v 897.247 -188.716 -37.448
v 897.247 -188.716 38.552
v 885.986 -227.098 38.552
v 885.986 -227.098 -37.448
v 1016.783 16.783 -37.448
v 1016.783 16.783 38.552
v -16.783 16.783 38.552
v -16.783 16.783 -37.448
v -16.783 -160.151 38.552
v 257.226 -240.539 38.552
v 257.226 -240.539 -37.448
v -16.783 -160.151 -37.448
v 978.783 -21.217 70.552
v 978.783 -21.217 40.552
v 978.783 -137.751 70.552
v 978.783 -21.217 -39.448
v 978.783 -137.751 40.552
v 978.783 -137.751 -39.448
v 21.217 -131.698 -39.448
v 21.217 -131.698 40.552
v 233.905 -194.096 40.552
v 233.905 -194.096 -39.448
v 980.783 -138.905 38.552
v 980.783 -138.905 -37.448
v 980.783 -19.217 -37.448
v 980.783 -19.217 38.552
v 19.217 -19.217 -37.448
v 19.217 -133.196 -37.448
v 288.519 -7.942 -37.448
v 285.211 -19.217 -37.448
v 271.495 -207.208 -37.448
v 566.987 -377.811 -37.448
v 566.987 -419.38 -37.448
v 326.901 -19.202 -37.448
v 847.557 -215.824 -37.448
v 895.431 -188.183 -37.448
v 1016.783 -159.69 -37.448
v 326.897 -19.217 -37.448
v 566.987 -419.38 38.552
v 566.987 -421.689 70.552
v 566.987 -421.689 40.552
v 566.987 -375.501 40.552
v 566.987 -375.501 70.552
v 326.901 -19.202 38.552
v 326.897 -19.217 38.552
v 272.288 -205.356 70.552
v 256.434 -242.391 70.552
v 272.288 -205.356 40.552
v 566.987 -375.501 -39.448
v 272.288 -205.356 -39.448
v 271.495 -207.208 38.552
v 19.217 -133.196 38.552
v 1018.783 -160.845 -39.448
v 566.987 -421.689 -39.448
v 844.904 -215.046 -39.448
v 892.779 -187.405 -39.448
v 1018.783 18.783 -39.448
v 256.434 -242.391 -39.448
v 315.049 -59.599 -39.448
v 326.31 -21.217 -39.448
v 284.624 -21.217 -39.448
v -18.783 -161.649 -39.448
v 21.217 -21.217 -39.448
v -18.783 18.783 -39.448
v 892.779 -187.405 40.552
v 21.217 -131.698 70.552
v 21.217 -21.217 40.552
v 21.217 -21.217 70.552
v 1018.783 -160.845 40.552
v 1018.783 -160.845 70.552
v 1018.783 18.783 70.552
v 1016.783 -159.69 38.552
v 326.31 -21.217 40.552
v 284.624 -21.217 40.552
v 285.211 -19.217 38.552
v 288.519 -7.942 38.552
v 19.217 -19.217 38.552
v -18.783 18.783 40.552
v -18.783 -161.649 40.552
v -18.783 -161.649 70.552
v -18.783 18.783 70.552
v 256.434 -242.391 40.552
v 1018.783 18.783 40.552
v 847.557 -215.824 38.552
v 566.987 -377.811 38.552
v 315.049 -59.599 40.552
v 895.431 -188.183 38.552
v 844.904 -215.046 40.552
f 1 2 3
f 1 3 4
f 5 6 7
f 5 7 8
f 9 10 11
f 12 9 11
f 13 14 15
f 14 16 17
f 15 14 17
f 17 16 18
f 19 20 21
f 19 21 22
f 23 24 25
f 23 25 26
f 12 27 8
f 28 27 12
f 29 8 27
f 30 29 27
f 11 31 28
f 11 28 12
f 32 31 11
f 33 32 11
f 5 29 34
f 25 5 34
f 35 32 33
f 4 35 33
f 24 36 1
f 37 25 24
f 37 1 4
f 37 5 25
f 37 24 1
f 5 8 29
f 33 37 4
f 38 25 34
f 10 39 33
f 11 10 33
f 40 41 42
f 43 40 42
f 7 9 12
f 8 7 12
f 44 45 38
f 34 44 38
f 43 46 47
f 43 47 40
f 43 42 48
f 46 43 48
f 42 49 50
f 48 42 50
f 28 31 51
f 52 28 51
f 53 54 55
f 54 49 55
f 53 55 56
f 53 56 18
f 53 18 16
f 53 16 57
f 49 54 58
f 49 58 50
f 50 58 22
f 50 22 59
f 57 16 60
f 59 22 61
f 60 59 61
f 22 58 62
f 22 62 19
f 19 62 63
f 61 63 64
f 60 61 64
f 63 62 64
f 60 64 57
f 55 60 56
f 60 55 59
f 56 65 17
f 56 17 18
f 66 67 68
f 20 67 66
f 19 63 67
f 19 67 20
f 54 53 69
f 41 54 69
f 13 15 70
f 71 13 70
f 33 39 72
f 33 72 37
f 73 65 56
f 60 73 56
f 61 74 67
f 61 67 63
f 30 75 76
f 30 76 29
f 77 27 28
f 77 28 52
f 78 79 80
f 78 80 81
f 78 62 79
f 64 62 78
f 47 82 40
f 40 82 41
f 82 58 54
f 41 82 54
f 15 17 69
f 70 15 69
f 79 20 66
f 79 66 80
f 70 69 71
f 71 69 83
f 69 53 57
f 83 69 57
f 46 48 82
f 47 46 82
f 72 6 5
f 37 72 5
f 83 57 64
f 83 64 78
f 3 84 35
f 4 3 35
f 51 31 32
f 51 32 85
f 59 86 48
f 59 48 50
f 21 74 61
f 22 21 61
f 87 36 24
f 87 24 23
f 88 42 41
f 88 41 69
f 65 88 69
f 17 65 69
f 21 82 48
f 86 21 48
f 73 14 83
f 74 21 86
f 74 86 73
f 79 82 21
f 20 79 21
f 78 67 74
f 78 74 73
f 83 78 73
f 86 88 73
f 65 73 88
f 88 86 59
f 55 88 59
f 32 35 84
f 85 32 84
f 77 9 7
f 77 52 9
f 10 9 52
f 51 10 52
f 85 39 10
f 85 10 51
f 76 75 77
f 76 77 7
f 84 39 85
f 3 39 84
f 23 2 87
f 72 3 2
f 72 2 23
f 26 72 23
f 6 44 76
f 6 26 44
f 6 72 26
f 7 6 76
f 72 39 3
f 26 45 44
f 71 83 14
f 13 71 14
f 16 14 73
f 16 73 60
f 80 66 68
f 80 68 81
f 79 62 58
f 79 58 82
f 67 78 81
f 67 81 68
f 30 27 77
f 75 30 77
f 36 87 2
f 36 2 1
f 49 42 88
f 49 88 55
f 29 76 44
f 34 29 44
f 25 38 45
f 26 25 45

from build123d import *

# Parameters (mm, degrees)
SKETCH_6_W      = 80
SKETCH_6_H      = 40
SKETCH_6_W_2    = 76
SKETCH_6_H_2    = 36
SKETCH_14_W     = 40
SKETCH_14_H     = 80
EXTRUDE_1_DEPTH = 194
SKETCH_15_W     = 80
SKETCH_15_H     = 40
EXTRUDE_2_DEPTH = 595
EXTRUDE_3_DEPTH = 30
EXTRUDE_4_DEPTH = 30
EXTRUDE_5_DEPTH = 30


with BuildPart() as part:
    # По траектории13: sweep along a curve in space
    with BuildLine() as sweep_13_path:
        Line((0, 0, 0), (1000, 0, 0))
        Line((1000, 0, 0), (1000, -150, 0))
        Line((1000, -150, 0), (566.987298108, -400, 0))
        Line((566.987298108, -400, 0), (263.878406783, -225, 0))
        Line((263.878406783, -225, 0), (0, -147.584326952, 0))
        Line((0, -147.584326952, 0), (0, 0, 0))
    # Эскиз6 → По траектории13 (sweep)
    with BuildSketch(Plane(origin=(0, 0, 0), x_dir=(0, 0, -1), z_dir=(1, 0, 0))):
        with Locations((-0.551773823, -1.216505436)):
            Rectangle(SKETCH_6_W, SKETCH_6_H)
        with Locations((-0.551773823, -1.216505436)):
            Rectangle(SKETCH_6_W_2, SKETCH_6_H_2, mode=Mode.SUBTRACT)
    sweep(path=sweep_13_path.line, transition=Transition.RIGHT)

    # Эскиз14 → Бобышка-Вытянуть1 (add)
    with BuildSketch(Plane(origin=(-33.89376203, -115.529989888, 0), x_dir=(0.9595578428480989, -0.2815115383580276, 0), z_dir=(0.2815115383580276, 0.9595578428480989, 0))):
        with Locations((299.085913187, -0.551773823)):
            Rectangle(SKETCH_14_W, SKETCH_14_H)
    extrude(amount=EXTRUDE_1_DEPTH)

    # Эскиз15 → Бобышка-Вытянуть2 (add)
    with BuildSketch(Plane(origin=(306.181390541, -89.82636629, 0), x_dir=(0, 0, -1), z_dir=(0.9595578428480989, -0.28151153835802767, 0))):
        with Locations((-0.551773823, 51.50143726)):
            Rectangle(SKETCH_15_W, SKETCH_15_H)
    extrude(amount=EXTRUDE_2_DEPTH)

    # Эскиз17 → Бобышка-Вытянуть3 (add)
    with BuildSketch(Plane.XY.offset(40.551773823)):
        Polygon((-18.783494564, 18.783494564), (21.216505436, -21.216505436), (21.216505436, -131.698036755), (-18.783494564, -161.648850746), align=None)
    extrude(amount=EXTRUDE_3_DEPTH)

    # Эскиз18 → Бобышка-Вытянуть4 (add)
    with BuildSketch(Plane.XY.offset(40.551773823)):
        Polygon((272.28762851, -205.356356178), (256.433515773, -242.391001456), (566.987298108, -421.689311285), (566.987298108, -375.50128975), align=None)
    extrude(amount=EXTRUDE_4_DEPTH)

    # Эскиз19 → Бобышка-Вытянуть5 (add)
    with BuildSketch(Plane.XY.offset(40.551773823)):
        Polygon((1018.783494564, 18.783494564), (978.783494564, -21.216505436), (978.783494564, -137.750644875), (1018.783494564, -160.844655643), align=None)
    extrude(amount=EXTRUDE_5_DEPTH)


solid = part.part
